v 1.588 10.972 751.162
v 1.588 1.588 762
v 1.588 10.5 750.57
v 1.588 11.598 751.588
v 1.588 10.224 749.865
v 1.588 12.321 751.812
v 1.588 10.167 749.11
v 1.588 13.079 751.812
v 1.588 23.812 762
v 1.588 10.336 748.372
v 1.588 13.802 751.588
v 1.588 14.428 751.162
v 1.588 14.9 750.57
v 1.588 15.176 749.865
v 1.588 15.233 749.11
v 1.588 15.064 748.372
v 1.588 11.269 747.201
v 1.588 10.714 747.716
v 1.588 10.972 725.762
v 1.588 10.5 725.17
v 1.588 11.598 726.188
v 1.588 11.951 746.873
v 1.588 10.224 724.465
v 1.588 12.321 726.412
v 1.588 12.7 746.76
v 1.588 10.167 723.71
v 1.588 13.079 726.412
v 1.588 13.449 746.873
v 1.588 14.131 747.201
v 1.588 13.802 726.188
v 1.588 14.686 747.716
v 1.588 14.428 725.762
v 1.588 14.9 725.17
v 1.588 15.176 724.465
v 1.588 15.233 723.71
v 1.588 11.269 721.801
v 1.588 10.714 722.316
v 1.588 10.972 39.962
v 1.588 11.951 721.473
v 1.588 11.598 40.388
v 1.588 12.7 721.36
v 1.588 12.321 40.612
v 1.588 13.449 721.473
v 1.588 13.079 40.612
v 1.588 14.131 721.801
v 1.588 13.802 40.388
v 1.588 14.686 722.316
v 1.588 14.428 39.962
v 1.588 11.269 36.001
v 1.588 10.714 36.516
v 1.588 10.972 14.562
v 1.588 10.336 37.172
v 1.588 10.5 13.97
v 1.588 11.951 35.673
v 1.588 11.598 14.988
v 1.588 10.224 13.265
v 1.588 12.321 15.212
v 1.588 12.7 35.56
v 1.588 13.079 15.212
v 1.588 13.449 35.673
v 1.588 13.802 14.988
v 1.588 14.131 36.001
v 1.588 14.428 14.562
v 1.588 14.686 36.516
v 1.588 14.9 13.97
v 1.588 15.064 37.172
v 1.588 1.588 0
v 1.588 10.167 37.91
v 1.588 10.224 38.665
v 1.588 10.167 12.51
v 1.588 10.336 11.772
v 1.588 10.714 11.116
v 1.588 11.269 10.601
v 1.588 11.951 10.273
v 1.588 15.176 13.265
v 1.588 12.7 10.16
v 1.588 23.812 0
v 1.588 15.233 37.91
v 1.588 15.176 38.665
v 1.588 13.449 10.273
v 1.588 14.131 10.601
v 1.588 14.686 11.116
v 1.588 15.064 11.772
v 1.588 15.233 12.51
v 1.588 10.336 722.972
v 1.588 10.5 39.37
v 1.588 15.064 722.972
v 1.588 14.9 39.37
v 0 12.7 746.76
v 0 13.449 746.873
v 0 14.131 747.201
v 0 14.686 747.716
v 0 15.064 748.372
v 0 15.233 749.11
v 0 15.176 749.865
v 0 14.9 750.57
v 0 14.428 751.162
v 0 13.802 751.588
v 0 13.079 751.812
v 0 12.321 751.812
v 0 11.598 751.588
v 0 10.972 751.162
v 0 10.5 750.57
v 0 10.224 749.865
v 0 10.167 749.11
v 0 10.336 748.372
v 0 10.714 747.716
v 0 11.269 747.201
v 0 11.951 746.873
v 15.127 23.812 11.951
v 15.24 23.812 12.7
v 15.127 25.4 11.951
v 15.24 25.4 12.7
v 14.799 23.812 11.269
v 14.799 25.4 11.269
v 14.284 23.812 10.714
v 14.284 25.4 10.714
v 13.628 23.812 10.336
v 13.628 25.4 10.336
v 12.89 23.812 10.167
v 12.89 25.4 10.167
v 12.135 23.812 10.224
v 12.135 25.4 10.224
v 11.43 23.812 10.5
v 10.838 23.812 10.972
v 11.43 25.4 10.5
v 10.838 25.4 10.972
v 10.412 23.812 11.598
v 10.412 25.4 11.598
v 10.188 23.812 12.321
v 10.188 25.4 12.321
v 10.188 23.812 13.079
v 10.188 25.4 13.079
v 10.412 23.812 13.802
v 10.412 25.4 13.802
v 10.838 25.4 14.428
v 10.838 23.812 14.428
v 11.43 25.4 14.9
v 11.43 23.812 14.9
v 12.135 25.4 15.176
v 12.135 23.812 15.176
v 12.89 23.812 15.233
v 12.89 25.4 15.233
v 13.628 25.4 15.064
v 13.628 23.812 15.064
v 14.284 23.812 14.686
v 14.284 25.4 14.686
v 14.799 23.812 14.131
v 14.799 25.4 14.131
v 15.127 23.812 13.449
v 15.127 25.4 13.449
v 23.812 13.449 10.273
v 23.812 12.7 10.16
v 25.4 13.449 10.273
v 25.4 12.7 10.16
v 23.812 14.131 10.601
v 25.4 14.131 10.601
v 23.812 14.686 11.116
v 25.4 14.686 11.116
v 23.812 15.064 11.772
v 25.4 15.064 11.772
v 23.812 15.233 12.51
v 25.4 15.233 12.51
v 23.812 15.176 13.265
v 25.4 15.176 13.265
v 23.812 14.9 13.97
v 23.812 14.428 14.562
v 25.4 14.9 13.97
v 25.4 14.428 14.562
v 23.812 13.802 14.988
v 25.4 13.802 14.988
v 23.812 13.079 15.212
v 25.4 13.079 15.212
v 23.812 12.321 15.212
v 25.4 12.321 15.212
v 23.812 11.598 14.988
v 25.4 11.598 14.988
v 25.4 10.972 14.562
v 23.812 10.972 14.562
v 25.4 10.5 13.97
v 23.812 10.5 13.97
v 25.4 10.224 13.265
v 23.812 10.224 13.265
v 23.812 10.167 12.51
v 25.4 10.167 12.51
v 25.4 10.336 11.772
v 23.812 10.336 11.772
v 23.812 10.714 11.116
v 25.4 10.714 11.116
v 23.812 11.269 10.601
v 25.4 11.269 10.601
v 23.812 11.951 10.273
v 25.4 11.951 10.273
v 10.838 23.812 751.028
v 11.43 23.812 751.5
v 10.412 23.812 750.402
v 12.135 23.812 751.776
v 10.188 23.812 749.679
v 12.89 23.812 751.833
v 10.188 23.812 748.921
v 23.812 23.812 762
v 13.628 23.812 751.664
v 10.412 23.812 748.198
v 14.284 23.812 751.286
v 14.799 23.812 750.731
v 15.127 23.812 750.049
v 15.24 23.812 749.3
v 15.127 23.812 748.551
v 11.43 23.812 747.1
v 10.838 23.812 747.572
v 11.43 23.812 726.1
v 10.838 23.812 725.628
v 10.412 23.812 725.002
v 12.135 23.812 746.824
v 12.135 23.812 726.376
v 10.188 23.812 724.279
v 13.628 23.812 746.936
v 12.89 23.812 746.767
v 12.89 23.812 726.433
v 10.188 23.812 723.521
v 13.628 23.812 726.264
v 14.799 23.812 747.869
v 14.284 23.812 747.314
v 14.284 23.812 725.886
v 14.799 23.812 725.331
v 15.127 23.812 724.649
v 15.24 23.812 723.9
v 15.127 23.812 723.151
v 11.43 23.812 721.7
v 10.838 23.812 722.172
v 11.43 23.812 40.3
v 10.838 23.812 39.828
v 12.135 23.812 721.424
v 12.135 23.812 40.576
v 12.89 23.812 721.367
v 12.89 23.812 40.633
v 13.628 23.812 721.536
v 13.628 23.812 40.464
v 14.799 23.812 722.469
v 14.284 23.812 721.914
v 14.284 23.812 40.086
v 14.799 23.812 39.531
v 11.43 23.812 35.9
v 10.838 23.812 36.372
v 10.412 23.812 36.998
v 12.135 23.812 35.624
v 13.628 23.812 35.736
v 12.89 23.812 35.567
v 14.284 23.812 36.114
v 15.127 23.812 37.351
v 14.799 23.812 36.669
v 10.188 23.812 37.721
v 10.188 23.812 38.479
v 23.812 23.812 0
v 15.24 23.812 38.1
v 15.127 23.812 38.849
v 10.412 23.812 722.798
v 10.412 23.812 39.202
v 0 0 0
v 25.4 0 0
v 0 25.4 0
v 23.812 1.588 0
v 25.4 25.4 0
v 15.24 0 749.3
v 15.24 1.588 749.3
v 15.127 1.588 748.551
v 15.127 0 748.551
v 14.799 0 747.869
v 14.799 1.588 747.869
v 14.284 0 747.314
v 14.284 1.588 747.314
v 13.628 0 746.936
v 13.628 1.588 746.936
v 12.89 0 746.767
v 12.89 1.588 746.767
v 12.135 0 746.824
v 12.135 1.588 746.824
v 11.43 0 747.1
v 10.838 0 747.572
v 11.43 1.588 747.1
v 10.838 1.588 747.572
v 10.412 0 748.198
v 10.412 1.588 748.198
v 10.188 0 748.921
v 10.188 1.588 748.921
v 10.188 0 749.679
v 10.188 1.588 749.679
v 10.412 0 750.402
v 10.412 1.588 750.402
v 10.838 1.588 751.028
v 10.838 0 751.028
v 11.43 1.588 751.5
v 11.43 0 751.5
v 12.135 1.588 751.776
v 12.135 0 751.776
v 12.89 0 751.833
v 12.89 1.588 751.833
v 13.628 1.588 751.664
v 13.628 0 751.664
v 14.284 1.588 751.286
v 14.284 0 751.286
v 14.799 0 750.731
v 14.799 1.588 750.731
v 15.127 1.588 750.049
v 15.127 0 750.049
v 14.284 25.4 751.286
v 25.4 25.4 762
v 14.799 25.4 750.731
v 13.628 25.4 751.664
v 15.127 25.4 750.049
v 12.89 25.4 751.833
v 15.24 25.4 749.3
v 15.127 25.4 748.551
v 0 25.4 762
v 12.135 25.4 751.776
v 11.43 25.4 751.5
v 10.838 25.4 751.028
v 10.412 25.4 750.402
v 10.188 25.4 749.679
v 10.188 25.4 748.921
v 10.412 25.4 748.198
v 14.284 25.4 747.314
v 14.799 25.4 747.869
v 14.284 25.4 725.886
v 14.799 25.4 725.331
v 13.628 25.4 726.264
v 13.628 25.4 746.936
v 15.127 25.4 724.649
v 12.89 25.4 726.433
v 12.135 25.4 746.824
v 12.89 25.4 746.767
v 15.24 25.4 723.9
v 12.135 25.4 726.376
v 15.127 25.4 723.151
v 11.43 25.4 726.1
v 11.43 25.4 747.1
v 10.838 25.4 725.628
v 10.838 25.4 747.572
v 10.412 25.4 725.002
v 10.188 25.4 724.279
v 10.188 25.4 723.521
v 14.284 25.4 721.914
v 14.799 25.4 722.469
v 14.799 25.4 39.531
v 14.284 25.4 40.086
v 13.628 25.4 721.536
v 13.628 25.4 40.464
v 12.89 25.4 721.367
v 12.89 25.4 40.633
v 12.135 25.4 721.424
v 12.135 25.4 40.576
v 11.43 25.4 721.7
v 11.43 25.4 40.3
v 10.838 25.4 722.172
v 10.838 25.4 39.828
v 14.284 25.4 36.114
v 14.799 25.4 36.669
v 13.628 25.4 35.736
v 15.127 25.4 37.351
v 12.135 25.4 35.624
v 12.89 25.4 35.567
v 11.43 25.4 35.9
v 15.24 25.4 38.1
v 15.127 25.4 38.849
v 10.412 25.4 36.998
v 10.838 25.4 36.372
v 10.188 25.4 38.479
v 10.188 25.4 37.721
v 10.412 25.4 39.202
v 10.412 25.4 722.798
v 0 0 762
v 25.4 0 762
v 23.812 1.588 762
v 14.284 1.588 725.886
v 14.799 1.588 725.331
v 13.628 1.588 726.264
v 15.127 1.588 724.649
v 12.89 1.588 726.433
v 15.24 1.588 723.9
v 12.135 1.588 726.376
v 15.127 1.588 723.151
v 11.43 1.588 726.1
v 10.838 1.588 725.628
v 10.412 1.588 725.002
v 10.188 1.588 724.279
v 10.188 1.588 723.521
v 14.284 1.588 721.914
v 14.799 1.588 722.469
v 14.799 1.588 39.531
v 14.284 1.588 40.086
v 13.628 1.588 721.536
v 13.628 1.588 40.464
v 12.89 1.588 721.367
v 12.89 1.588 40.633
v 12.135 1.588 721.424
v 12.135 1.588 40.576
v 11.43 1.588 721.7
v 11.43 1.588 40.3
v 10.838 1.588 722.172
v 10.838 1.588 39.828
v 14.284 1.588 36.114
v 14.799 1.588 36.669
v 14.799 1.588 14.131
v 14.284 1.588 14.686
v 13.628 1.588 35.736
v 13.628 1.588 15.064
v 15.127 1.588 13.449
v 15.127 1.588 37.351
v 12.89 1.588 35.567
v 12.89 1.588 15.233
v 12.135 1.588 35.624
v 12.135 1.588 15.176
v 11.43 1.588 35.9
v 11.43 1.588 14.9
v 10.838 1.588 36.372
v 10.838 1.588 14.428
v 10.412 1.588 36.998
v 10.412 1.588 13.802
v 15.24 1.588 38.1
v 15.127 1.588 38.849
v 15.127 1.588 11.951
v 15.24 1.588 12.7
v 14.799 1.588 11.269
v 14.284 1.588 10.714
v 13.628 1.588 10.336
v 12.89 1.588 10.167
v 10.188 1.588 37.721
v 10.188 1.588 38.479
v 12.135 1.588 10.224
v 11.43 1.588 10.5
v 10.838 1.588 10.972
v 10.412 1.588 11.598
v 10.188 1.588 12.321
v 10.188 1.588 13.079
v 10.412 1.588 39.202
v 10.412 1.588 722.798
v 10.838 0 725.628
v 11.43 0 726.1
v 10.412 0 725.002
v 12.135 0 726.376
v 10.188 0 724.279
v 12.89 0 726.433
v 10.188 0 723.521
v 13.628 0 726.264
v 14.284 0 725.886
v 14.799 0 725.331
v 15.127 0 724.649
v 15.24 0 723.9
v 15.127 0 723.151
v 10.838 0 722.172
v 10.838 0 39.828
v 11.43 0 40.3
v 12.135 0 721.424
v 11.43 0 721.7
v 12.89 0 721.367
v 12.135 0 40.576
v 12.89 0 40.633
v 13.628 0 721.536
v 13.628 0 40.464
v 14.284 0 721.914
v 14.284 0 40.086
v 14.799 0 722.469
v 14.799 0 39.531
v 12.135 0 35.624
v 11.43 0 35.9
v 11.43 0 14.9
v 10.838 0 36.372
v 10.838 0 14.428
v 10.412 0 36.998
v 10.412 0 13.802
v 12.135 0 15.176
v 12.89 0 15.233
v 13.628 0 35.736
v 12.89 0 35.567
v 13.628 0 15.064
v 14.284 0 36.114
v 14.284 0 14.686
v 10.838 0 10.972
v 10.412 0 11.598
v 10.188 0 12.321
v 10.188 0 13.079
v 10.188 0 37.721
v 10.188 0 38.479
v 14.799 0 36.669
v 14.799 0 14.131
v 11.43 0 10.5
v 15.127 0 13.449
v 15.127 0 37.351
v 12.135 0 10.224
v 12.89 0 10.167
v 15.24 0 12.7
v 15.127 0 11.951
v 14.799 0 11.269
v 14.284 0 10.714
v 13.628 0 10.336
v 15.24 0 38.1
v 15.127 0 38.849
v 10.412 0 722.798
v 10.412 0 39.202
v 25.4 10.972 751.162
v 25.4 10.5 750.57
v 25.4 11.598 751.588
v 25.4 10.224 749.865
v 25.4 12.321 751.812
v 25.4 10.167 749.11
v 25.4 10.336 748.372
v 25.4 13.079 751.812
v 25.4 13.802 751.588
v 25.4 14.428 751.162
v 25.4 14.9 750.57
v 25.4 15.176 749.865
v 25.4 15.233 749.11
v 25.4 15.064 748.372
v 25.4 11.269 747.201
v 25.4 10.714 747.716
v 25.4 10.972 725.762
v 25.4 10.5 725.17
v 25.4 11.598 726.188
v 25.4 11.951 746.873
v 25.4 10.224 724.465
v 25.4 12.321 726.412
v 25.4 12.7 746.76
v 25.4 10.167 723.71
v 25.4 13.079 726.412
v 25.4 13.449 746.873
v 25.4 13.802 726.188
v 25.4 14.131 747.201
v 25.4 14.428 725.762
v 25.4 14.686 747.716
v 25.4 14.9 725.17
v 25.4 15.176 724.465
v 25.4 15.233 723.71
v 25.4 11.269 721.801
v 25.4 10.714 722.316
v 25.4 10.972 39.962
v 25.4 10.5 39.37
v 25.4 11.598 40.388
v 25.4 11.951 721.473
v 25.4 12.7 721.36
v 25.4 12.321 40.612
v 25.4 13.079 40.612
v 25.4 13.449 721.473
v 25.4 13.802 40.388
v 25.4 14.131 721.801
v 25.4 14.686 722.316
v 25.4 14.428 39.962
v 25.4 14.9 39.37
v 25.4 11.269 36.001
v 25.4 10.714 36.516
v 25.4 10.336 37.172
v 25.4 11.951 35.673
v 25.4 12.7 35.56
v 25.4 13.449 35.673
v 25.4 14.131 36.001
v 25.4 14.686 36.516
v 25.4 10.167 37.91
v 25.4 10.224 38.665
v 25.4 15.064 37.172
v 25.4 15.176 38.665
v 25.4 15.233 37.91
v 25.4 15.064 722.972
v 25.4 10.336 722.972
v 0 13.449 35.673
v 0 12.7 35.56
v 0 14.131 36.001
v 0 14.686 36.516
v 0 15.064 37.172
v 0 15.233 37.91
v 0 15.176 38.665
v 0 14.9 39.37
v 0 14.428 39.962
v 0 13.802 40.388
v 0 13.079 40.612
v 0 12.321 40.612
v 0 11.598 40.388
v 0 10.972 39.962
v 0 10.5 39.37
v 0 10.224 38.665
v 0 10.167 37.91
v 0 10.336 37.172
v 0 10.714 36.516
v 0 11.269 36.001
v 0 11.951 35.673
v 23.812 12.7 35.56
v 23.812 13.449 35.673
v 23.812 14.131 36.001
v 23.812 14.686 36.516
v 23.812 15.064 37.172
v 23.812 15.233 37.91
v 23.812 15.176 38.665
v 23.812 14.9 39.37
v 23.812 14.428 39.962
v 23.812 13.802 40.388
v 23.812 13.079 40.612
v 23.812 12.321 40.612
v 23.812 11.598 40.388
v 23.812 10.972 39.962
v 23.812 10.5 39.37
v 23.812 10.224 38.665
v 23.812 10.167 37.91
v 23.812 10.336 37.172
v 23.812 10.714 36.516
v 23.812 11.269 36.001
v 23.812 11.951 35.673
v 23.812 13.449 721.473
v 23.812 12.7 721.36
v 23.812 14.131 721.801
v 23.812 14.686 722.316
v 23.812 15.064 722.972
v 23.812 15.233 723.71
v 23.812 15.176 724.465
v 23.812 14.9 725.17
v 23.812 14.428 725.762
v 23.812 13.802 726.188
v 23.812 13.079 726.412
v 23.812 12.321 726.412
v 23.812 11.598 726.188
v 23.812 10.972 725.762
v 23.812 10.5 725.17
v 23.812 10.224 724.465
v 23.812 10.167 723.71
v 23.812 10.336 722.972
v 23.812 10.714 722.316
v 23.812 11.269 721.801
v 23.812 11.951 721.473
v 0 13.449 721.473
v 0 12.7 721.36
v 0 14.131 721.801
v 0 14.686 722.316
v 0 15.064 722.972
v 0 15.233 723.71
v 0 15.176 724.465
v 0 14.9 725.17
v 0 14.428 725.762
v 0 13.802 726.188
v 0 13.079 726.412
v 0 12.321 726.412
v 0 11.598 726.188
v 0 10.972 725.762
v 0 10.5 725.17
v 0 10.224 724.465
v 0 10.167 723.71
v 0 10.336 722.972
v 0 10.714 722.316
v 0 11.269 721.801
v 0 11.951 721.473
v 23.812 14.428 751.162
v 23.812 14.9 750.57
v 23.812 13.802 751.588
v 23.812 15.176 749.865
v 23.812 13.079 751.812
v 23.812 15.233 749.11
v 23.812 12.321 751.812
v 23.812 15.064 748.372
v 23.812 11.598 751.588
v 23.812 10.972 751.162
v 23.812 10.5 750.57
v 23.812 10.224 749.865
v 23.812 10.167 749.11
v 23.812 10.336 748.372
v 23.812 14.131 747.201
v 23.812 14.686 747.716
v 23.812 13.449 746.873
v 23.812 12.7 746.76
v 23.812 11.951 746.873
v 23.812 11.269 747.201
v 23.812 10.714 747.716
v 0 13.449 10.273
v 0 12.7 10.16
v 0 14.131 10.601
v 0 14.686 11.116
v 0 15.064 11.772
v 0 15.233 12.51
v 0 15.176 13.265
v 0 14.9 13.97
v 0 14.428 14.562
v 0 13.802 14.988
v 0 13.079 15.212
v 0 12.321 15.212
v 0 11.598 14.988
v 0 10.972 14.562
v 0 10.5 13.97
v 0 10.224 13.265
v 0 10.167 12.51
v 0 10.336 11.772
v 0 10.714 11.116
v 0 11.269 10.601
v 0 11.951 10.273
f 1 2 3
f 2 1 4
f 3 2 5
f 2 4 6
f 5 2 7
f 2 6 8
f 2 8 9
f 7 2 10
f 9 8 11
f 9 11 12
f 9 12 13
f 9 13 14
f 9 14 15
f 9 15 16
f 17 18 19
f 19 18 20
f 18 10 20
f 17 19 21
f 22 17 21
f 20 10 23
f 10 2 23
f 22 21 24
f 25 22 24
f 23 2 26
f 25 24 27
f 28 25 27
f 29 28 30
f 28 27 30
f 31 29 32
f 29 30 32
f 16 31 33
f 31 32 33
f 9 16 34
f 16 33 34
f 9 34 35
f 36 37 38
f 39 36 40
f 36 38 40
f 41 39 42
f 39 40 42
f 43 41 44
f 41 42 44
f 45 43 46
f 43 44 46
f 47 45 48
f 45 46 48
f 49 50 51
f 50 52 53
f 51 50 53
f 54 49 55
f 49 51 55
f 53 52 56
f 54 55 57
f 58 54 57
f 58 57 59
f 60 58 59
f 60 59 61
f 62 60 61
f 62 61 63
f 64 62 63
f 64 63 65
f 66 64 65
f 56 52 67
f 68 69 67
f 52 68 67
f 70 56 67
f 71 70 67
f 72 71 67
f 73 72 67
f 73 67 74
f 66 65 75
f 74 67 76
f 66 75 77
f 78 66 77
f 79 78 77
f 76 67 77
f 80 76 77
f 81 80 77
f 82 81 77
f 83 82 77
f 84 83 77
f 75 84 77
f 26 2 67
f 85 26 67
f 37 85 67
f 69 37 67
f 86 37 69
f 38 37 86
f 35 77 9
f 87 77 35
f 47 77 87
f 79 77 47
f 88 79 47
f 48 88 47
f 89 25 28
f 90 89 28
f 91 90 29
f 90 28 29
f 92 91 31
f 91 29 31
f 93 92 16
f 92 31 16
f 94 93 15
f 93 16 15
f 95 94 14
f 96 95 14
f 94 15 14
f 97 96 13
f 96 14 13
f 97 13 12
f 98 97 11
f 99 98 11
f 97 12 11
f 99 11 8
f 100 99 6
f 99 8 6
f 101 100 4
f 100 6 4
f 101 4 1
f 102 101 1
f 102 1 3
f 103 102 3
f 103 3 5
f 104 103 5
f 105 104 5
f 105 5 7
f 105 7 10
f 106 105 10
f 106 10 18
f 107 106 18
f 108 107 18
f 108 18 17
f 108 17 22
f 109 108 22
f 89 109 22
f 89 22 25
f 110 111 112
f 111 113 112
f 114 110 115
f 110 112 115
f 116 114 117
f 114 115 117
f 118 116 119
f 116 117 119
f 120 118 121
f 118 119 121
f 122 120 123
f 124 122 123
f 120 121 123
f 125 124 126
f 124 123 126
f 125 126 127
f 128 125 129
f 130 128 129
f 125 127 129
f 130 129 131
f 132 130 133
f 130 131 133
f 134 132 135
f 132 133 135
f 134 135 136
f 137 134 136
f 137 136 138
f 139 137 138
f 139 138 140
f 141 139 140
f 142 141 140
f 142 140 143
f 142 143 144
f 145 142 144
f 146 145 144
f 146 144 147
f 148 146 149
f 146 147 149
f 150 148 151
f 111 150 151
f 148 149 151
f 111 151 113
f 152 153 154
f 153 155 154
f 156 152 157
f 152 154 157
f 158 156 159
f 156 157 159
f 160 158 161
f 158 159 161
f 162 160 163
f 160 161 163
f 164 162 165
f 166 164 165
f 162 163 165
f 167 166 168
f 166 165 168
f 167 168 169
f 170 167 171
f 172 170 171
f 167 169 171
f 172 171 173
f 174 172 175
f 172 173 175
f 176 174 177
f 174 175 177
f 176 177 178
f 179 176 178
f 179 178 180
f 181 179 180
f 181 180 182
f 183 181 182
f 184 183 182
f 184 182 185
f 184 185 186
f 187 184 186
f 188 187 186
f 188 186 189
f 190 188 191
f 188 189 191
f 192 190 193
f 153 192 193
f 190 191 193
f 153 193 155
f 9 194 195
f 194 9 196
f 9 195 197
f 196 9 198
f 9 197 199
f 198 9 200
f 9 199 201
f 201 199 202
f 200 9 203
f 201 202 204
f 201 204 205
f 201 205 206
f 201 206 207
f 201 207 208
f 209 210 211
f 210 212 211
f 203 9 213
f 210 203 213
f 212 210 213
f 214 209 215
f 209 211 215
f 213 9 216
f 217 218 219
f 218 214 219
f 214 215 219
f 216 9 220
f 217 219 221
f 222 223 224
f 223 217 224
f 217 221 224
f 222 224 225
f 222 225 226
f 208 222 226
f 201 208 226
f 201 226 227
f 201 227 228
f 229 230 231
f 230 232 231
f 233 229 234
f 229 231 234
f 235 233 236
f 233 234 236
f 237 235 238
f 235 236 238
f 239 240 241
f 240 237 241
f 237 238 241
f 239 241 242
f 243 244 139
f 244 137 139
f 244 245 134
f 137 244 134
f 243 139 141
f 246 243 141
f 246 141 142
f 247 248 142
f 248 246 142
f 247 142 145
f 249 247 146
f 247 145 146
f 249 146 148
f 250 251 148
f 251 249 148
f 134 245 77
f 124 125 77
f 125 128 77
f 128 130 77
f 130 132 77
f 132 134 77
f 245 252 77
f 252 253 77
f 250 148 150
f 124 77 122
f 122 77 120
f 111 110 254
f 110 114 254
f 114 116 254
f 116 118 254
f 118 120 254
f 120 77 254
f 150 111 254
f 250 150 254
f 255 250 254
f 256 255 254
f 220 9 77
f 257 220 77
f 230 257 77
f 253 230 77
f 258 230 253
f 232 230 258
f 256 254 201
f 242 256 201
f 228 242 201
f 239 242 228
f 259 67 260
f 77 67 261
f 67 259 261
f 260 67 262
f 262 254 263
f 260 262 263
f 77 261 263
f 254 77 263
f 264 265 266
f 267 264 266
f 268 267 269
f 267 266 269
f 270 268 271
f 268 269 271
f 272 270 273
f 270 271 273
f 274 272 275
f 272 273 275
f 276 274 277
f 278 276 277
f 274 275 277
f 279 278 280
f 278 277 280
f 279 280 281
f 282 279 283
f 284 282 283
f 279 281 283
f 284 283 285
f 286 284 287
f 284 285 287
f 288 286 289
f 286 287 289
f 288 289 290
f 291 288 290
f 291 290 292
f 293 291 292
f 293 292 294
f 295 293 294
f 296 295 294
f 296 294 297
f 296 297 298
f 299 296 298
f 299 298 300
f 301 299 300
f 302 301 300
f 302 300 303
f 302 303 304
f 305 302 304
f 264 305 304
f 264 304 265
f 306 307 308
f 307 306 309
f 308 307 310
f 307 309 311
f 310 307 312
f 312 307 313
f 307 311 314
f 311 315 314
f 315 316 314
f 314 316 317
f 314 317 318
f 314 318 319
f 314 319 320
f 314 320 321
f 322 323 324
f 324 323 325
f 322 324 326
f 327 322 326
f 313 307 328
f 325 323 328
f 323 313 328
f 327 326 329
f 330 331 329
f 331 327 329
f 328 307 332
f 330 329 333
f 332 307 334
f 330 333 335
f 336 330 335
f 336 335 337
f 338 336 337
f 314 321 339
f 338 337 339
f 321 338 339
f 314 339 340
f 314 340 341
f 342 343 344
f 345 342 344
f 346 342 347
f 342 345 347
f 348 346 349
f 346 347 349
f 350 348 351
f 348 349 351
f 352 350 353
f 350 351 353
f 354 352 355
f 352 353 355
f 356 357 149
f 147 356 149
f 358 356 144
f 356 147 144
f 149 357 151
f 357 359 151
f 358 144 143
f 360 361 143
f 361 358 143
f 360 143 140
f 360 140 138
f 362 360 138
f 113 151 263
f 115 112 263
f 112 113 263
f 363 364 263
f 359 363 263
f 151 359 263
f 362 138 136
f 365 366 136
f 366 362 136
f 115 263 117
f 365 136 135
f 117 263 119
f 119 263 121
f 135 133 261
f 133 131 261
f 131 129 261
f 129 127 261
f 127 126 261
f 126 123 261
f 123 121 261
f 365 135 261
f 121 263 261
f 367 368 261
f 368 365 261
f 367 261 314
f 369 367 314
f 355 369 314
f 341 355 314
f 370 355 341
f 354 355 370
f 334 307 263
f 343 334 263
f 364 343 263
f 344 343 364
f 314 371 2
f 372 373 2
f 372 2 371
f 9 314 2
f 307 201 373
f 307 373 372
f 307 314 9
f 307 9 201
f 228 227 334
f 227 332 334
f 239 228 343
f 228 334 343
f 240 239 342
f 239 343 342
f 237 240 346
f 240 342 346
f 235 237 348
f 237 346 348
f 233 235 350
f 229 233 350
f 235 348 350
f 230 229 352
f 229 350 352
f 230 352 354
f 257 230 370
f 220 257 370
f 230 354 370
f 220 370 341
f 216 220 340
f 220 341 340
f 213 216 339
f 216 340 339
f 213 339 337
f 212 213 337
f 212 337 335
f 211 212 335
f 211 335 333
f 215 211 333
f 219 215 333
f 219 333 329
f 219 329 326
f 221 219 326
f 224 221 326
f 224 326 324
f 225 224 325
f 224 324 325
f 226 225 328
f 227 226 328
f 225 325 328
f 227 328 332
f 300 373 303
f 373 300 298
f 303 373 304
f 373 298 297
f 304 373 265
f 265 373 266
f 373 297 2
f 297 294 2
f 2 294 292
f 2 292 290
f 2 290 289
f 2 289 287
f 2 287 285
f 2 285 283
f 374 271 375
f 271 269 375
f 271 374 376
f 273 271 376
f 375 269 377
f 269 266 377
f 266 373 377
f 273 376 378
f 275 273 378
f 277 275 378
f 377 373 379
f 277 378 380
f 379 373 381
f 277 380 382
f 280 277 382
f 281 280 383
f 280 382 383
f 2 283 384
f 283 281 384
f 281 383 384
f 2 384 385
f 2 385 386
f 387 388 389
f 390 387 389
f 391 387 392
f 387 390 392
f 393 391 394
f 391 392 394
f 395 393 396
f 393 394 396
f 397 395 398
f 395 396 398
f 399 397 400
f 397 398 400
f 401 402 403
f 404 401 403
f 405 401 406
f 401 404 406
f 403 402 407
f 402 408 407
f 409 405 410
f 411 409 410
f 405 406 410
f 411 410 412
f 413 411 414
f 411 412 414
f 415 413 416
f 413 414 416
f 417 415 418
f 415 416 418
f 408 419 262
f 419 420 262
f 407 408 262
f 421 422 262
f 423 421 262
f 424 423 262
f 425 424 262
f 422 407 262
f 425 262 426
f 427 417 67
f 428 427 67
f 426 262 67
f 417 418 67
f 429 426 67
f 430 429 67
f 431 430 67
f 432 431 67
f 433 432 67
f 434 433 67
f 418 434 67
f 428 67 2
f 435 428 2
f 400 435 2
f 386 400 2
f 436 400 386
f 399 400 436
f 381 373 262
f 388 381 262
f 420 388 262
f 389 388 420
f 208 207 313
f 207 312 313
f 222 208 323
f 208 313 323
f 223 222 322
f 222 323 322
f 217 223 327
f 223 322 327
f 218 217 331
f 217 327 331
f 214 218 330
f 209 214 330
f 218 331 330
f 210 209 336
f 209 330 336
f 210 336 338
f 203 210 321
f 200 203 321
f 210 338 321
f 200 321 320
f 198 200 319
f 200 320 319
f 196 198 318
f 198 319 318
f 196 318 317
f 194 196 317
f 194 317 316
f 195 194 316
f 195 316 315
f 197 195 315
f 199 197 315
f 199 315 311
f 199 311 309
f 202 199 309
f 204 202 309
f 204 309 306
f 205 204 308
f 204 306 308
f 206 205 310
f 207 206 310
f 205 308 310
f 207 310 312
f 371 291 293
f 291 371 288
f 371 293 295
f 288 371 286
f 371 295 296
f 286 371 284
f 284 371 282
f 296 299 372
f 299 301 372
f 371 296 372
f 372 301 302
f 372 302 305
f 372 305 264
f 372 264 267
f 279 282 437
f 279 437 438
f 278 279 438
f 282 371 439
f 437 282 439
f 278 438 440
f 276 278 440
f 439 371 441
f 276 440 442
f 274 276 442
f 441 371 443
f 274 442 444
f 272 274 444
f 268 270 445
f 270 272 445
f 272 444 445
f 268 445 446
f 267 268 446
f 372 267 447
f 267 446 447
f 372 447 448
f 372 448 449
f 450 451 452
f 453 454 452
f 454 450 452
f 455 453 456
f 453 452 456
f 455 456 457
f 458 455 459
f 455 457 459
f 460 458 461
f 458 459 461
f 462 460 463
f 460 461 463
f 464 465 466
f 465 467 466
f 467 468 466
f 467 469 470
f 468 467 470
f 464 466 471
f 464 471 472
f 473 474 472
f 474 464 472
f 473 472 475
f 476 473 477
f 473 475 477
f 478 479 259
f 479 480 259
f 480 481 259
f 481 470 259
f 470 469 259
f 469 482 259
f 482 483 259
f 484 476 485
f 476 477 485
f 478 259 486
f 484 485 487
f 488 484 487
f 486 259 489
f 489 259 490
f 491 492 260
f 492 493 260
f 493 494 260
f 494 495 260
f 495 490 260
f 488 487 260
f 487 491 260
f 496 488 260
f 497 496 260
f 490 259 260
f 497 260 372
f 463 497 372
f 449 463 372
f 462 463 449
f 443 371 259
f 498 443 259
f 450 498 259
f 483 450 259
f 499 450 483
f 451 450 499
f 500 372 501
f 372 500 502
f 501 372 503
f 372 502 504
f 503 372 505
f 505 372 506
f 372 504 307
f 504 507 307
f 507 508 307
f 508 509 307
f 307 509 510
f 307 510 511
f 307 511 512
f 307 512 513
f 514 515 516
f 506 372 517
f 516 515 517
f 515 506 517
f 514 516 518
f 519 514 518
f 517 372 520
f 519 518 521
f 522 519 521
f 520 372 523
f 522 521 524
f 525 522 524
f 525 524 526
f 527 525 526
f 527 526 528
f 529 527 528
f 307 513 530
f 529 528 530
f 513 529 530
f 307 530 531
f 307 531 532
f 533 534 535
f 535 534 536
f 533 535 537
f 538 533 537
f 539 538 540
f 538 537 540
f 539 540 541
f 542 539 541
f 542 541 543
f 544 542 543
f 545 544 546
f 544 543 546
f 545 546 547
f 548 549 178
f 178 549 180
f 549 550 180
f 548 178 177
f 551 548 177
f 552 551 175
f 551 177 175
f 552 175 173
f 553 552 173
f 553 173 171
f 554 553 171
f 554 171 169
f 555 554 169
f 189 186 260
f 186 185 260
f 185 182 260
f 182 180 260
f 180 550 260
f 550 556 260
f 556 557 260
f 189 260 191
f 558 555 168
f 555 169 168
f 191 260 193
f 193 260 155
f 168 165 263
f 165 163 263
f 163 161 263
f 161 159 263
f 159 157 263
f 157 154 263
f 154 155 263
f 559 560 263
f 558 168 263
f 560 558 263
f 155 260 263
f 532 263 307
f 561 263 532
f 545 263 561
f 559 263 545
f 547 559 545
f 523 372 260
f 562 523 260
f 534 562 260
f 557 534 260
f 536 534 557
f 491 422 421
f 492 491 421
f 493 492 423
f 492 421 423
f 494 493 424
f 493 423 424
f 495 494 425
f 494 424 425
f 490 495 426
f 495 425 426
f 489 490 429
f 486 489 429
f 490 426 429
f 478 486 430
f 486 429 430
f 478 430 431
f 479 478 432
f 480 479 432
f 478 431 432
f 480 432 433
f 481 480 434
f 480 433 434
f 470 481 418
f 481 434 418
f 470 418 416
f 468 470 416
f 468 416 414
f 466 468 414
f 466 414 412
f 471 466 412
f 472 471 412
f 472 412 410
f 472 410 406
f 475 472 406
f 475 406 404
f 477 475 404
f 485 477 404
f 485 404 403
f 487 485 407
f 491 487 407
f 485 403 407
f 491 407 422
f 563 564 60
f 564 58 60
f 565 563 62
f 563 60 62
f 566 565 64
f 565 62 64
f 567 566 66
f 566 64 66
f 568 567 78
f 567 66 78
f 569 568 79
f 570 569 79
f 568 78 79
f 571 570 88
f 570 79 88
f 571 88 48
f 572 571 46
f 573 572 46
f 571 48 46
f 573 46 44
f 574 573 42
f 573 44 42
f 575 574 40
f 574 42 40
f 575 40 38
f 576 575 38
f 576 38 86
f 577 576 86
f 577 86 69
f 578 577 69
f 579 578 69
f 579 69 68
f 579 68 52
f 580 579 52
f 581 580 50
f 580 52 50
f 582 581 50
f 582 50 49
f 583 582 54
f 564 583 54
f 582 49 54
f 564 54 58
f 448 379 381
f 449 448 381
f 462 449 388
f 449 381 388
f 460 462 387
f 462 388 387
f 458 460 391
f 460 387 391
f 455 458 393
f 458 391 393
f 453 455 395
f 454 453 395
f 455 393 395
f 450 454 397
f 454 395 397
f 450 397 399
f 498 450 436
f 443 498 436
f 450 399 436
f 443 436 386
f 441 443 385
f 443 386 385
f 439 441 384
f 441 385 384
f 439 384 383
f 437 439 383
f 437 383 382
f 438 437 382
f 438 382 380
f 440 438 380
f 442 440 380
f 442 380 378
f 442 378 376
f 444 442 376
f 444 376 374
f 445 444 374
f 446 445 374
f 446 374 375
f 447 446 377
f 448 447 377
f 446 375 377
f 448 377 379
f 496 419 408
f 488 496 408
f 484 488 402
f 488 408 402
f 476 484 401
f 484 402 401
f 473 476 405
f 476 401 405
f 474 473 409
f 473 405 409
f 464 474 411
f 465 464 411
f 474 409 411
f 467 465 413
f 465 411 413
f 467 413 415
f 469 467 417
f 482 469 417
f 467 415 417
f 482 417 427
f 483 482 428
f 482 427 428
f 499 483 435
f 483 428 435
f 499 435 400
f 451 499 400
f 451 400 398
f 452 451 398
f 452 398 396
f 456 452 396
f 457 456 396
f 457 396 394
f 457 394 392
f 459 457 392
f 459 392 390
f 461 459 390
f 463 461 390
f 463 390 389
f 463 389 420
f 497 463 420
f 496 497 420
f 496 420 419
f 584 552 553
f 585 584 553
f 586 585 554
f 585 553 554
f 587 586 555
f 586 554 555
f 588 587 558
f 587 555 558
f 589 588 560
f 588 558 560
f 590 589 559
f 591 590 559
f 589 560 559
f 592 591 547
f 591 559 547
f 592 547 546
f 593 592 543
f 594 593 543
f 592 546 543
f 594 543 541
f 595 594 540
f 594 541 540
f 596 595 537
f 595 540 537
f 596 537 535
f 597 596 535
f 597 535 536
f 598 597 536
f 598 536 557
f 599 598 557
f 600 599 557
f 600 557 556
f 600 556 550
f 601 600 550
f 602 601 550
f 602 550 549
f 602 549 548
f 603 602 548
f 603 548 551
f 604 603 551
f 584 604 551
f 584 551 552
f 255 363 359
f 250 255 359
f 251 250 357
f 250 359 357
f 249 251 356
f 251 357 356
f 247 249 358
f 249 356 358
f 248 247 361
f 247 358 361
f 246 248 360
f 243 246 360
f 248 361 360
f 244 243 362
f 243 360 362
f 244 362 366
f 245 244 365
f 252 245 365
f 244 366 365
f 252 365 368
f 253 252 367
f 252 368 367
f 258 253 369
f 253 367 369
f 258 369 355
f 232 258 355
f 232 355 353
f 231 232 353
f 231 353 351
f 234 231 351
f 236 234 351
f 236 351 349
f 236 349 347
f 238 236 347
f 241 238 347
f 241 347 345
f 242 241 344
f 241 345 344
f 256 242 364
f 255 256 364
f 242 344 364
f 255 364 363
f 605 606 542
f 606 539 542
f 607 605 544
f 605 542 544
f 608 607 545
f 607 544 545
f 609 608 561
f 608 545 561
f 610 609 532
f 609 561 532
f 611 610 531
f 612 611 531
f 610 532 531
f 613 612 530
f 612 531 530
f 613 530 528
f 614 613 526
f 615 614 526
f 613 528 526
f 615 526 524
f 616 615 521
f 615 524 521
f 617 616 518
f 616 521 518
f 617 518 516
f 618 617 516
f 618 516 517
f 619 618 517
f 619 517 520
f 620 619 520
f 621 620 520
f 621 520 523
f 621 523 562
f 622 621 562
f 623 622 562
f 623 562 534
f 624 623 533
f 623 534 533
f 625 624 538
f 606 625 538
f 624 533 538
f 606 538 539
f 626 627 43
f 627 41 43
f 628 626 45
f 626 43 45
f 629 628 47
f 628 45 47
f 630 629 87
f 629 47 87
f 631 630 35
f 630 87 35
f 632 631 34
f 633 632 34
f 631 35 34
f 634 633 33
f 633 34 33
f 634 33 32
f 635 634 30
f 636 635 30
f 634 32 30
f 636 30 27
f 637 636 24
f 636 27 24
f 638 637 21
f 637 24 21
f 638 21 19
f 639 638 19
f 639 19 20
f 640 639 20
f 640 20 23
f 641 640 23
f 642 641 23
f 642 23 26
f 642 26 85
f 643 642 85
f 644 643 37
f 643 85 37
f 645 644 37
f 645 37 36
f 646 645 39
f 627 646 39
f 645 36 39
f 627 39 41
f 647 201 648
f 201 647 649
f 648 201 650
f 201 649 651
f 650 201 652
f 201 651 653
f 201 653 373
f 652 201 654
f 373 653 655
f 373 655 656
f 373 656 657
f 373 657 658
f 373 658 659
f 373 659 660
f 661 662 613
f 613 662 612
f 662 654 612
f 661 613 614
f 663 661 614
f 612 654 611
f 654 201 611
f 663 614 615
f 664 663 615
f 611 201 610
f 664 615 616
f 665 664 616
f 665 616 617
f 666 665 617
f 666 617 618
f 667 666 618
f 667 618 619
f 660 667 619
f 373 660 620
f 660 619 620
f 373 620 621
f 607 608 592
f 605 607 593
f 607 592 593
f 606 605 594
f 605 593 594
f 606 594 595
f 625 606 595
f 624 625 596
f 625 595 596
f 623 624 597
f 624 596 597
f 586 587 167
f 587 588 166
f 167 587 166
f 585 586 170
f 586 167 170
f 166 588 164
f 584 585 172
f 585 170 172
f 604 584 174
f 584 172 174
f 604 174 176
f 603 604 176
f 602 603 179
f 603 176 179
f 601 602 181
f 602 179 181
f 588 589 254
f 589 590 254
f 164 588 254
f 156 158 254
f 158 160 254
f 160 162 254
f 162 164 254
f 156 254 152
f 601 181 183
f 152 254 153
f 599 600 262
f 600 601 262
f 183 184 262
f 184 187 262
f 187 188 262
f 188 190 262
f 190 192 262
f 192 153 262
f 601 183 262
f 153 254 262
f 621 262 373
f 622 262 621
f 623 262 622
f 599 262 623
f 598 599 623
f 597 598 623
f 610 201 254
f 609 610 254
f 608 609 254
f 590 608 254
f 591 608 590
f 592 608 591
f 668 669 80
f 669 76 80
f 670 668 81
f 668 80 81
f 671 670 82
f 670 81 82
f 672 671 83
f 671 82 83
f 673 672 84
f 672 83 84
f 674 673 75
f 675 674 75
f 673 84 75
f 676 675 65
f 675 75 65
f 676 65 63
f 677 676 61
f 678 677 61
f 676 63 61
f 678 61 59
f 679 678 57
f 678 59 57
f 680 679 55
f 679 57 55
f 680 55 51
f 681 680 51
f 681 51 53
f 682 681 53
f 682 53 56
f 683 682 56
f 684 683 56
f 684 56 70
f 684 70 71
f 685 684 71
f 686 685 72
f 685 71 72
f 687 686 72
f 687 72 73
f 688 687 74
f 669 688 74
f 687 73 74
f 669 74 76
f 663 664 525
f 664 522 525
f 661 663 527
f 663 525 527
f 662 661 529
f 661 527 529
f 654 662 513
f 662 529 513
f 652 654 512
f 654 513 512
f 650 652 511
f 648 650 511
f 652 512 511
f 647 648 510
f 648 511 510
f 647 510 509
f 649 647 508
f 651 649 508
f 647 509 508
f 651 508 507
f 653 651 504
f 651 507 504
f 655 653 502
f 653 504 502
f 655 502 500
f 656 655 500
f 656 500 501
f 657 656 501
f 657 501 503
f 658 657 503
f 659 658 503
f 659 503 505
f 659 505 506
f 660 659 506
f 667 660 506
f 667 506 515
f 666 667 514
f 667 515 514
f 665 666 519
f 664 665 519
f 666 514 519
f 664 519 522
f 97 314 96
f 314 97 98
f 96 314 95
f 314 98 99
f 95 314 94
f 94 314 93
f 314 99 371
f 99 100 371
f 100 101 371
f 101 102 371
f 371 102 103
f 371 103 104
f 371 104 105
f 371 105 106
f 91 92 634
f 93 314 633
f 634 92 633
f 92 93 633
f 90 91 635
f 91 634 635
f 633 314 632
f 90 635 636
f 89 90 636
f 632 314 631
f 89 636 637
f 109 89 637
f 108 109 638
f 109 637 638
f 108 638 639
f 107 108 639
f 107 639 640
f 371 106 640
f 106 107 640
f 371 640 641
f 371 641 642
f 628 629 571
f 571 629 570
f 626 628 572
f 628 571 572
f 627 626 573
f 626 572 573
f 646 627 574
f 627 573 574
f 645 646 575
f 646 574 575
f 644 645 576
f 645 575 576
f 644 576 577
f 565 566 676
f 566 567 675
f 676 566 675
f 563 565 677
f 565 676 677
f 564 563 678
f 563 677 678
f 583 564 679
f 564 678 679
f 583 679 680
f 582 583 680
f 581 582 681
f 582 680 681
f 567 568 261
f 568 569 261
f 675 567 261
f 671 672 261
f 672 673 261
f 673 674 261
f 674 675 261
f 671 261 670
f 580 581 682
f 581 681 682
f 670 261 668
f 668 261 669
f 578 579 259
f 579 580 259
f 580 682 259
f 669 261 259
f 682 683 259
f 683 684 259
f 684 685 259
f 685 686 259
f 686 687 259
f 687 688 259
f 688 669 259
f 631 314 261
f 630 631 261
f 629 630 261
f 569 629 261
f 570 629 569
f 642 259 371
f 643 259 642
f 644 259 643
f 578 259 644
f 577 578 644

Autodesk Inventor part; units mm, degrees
ref_plane "YZ Plane" through (0, 0, 0) normal (1, 0, 0) x (0, 1, 0)
ref_plane "XZ Plane" through (0, 0, 0) normal (0, 1, 0) x (-1, 0, 0)
ref_plane "XY Plane" through (0, 0, 0) normal (0, 0, 1) x (1, 0, 0)
sketch "Sketch1" plane through (0, 0, 0) normal (0, 0, 1) x (1, 0, 0)
  line L0 (0, 0) -> (25.4, 0)
  line L1 (25.4, 0) -> (25.4, 25.4)
  line L2 (25.4, 25.4) -> (0, 25.4)
  line L3 (0, 25.4) -> (0, 0)
  line L4 (1.5875, 23.8125) -> (23.8125, 23.8125)
  line L5 (23.8125, 23.8125) -> (23.8125, 1.5875)
  line L6 (23.8125, 1.5875) -> (1.5875, 1.5875)
  line L7 (1.5875, 1.5875) -> (1.5875, 23.8125)
  dimension "d0" = 25.4
  dimension "d1" = 25.4
  dimension "d2" = 1.5875
  dimension "d3" = 1.5875
  dimension "d4" = 1.5875
  dimension "d5" = 1.5875
extrude "Extrusion1" add sketch "Sketch1" along normal blind 762
sketch "Sketch2" plane through (25.4, 0, 0) normal (1, 0, 0) x (0, 0, -1)
  line L0 (0, 1.5875) -> (0, 23.8125) projected
  line L1 (0, 12.7) -> (-762, 12.7)
  line L2 (-762, 23.8125) -> (-762, 1.5875) projected
  line L3 (-762, 12.7) -> (-749.3, 12.7)
  line L4 (-749.3, 12.7) -> (-723.9, 12.7)
  line L5 (0, 12.7) -> (-12.7, 12.7)
  line L6 (-12.7, 12.7) -> (-38.1, 12.7)
  circle A0 centre (-12.7, 12.7) radius 2.54
  circle A1 centre (-38.1, 12.7) radius 2.54
  circle A2 centre (-723.9, 12.7) radius 2.54
  circle A3 centre (-749.3, 12.7) radius 2.54
  point P0 (0, 0)
  dimension "d8" = 12.7
  dimension "d9" = 25.4
  dimension "d10" = 12.7
  dimension "d11" = 25.4
  dimension "d12" = 5.08
extrude "Extrusion2" cut sketch "Sketch2" against normal blind 25.4
sketch "Sketch3" plane through (0, 25.4, 0) normal (0, 1, 0) x (1, 0, 0)
  line L0 (23.8125, 0) -> (1.5875, 0) projected
  line L1 (12.7, 0) -> (12.7, -762)
  line L2 (25.4, -762) -> (0, -762) projected
  line L3 (12.7, -762) -> (12.7, -749.3)
  line L4 (12.7, -749.3) -> (12.7, -723.9)
  line L5 (12.7, 0) -> (12.7, -12.7)
  line L6 (12.7, -12.7) -> (12.7, -38.1)
  circle A0 centre (12.7, -12.7) radius 2.54
  circle A1 centre (12.7, -38.1) radius 2.54
  circle A2 centre (12.7, -723.9) radius 2.54
  circle A3 centre (12.7, -749.3) radius 2.54
  point P0 (0, 0)
  dimension "d15" = 12.7
  dimension "d16" = 25.4
  dimension "d17" = 12.7
  dimension "d18" = 25.4
  dimension "d19" = 5.08
extrude "Extrusion3" cut sketch "Sketch3" against normal blind 25.4
properties part number "1x1" material "Aluminum 6061"
